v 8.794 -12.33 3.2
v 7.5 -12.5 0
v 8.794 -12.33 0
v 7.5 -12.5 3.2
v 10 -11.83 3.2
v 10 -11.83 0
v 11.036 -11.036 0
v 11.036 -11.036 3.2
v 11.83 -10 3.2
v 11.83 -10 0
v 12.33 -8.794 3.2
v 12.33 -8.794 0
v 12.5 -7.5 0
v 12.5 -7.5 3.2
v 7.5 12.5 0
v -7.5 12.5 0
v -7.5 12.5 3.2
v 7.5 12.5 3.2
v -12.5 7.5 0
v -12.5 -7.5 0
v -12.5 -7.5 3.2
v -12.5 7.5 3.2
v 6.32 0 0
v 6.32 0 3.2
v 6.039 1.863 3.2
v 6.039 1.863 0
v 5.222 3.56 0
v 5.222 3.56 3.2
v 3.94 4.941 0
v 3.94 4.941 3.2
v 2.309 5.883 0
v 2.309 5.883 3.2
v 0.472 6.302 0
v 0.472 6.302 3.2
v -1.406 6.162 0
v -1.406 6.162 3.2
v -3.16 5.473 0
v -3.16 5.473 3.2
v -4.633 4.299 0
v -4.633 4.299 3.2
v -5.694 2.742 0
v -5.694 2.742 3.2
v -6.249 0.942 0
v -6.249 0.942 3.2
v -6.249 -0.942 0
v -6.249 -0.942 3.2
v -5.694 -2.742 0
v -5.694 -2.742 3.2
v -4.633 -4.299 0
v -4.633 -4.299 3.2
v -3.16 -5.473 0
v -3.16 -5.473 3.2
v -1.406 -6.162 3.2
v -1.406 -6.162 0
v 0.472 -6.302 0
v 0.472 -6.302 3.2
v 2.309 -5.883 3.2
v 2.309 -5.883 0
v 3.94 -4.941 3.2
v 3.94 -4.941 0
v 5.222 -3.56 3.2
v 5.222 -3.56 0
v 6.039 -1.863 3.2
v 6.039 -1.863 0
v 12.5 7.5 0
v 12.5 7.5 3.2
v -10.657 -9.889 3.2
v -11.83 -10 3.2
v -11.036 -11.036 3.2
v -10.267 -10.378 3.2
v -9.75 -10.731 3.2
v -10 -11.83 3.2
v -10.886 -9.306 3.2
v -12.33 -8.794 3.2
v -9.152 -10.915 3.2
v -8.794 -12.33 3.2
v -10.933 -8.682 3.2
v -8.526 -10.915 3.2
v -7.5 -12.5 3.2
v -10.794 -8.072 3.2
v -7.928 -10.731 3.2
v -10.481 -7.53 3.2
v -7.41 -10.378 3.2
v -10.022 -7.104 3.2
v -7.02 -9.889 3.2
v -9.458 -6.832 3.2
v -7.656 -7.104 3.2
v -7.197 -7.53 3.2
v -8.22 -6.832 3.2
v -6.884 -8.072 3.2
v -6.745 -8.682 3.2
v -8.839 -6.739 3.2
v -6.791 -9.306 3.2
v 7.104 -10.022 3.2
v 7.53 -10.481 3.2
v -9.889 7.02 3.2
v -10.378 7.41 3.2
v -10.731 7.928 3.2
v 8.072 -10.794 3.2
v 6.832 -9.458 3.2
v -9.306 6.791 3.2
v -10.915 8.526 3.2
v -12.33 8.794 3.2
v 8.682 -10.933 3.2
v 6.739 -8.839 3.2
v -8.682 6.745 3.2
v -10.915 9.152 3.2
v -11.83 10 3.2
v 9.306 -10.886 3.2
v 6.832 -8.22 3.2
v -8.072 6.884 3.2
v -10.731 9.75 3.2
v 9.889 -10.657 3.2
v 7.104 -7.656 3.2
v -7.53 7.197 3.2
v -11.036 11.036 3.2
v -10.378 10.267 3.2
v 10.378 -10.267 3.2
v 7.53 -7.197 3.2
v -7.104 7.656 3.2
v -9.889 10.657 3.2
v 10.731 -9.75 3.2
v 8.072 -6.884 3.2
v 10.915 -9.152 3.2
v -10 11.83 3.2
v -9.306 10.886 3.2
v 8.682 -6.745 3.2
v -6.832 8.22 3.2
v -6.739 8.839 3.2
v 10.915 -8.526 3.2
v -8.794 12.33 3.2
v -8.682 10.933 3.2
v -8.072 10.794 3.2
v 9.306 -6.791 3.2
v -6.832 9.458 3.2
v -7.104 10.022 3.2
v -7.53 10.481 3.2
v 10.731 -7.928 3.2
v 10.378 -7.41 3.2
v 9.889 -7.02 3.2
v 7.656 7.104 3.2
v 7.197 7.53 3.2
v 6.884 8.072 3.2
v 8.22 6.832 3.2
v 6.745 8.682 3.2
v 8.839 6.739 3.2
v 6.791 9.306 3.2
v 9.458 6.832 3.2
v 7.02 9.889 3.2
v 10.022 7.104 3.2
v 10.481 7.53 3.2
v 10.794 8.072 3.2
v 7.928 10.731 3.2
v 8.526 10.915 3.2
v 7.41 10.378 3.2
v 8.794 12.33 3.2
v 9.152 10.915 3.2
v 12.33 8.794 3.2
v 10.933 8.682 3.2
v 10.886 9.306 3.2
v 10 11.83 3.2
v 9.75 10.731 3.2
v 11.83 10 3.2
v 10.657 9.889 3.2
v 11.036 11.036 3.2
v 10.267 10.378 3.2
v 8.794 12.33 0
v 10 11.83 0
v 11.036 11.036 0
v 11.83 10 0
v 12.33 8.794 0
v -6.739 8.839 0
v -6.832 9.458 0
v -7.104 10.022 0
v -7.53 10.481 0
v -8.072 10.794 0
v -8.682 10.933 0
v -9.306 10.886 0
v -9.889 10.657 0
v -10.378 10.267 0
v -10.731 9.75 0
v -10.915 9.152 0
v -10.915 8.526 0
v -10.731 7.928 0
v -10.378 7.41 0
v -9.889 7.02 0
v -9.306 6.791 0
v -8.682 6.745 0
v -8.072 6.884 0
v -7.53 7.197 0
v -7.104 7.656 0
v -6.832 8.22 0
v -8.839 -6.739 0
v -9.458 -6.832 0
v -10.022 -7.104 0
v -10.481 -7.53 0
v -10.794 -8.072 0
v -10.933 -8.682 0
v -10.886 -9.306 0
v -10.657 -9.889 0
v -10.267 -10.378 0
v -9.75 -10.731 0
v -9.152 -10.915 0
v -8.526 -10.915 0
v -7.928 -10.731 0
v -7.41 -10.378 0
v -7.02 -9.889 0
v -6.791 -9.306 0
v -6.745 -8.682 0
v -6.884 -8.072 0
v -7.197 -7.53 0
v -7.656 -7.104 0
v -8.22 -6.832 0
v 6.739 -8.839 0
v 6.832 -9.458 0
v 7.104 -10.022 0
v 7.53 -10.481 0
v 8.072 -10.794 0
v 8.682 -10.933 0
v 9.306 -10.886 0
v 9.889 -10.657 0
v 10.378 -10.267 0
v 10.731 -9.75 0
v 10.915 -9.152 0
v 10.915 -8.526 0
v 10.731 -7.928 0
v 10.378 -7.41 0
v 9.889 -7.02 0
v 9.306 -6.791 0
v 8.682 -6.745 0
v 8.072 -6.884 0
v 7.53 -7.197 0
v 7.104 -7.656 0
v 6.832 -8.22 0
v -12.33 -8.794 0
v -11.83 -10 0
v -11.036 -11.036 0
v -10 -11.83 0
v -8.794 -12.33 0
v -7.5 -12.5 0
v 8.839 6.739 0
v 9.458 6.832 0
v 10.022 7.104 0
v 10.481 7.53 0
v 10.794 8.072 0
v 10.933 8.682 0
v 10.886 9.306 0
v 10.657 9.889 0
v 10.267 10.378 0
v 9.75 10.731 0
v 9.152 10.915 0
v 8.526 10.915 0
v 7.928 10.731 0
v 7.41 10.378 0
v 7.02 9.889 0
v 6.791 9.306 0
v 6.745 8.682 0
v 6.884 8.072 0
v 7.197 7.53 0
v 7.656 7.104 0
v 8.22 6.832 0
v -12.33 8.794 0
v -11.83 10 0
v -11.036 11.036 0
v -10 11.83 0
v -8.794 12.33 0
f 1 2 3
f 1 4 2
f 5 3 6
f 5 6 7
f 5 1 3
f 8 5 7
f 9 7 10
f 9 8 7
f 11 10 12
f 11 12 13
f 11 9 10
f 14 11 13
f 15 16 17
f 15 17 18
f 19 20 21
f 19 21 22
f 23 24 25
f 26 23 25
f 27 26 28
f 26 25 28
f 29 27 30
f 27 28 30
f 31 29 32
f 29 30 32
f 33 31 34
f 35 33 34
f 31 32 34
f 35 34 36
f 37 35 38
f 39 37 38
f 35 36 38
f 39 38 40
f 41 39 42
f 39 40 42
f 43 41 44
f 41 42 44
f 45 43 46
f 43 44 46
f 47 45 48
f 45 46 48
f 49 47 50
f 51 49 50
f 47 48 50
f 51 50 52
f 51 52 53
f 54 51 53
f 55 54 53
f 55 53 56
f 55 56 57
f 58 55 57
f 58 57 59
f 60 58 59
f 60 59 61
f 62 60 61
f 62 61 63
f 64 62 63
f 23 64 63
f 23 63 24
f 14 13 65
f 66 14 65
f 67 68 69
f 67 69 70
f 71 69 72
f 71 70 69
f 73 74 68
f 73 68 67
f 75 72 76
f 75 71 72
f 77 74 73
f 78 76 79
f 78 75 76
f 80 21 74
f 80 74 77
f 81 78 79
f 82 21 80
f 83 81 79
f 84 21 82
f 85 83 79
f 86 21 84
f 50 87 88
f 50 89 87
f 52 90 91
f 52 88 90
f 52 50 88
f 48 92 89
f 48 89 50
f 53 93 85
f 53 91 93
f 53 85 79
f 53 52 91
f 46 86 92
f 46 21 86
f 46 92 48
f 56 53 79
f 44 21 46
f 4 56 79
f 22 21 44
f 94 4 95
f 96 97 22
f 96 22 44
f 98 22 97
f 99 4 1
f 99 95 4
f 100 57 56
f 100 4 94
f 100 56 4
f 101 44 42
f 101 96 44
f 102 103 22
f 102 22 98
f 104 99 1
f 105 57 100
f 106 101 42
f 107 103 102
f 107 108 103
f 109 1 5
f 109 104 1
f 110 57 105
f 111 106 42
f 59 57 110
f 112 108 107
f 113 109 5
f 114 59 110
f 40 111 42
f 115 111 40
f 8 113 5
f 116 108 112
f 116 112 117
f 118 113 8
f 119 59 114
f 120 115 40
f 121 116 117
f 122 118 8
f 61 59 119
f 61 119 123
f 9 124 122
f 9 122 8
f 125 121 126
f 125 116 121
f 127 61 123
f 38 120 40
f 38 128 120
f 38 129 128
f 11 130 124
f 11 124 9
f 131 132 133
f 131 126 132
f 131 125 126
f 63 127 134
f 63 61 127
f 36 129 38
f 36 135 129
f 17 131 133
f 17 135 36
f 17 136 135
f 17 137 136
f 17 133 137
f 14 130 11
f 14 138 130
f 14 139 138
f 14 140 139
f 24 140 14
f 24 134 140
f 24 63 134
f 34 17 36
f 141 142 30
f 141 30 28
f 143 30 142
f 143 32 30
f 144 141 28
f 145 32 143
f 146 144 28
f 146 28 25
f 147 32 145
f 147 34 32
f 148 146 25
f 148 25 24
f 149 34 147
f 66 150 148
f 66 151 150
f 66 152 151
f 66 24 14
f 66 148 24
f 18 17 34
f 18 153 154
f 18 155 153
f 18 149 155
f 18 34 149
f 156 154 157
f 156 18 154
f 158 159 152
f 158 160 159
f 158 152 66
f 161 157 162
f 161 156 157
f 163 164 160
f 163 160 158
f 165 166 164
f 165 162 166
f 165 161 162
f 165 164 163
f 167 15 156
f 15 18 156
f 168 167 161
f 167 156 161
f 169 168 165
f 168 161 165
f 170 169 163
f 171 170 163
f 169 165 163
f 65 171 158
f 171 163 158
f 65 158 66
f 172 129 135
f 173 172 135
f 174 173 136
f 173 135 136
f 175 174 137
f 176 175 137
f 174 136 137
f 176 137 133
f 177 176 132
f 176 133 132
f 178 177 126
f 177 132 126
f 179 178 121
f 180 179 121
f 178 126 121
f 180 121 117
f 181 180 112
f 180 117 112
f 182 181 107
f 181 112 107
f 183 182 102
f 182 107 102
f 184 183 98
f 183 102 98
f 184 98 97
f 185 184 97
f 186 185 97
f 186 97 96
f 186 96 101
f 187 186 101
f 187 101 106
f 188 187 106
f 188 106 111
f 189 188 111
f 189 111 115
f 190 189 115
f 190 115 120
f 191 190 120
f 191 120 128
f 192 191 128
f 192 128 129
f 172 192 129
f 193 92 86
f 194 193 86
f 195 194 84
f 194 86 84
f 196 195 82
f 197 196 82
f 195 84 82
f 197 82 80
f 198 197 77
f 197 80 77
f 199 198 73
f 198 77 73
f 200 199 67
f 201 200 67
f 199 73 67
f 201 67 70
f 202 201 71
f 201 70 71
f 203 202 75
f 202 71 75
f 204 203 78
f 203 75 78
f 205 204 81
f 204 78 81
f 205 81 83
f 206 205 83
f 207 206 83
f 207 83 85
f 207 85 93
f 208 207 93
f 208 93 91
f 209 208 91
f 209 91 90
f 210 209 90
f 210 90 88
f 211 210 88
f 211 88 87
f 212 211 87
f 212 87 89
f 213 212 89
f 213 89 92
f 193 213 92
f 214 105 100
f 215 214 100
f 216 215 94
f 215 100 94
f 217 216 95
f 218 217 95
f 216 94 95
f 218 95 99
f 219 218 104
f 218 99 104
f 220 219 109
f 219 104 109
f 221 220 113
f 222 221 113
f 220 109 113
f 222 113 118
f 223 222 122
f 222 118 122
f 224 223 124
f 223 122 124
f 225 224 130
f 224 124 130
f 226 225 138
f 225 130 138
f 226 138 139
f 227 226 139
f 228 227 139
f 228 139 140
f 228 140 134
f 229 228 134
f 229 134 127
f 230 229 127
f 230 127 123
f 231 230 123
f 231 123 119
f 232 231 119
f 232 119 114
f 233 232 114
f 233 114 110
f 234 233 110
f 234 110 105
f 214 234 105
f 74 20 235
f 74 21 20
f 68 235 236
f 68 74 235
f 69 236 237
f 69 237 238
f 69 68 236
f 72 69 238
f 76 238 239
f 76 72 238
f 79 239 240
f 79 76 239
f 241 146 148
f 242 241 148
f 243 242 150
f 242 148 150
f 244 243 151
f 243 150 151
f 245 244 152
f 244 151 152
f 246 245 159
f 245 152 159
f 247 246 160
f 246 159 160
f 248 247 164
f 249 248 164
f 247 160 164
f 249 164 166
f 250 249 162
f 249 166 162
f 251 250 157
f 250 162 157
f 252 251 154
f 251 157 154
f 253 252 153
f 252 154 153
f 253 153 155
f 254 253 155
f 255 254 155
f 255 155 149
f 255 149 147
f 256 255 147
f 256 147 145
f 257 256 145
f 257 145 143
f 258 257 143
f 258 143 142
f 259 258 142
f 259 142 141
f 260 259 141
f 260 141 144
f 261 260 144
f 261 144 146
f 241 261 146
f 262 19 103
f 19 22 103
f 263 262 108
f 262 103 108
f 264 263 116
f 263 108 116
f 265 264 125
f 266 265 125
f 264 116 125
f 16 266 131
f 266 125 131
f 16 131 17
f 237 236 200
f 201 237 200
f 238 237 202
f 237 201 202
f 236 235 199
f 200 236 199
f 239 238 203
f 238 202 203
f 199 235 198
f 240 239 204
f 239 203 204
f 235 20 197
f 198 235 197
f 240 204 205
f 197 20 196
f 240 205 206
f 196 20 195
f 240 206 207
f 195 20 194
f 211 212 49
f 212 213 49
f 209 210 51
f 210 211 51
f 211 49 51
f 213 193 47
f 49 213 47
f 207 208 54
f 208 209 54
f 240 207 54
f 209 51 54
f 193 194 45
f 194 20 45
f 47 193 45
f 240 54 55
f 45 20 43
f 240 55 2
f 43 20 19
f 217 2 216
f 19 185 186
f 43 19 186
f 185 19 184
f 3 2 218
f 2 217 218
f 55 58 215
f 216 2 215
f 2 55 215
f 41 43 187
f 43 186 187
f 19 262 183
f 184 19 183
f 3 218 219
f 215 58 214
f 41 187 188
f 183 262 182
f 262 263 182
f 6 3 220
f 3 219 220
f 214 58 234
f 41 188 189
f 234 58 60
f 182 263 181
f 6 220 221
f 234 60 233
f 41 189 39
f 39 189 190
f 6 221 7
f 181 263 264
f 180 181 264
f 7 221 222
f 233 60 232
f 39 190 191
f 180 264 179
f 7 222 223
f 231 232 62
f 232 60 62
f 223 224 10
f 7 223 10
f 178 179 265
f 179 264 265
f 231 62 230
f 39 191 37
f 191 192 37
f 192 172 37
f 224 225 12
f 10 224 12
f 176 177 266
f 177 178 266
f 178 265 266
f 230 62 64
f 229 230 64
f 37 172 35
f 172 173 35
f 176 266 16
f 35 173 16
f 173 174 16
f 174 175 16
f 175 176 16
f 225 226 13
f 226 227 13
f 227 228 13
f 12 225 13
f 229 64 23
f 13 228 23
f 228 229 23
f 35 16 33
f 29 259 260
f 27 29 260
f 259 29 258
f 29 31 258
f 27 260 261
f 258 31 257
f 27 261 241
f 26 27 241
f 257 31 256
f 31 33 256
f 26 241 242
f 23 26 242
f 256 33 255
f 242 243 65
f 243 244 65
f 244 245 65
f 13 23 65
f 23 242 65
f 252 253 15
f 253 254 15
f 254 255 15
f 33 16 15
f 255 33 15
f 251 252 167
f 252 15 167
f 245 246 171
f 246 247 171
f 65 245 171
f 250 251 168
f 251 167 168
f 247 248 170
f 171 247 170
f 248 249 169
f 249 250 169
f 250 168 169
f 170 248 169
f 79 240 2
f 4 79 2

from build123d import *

# Parameters (mm, degrees)
SKETCH1_W           = 25
SKETCH1_H           = 25
BOSS_EXTRUDE1_DEPTH = 3.2
CUT_EXTRUDE1_REACH  = 5.2
SKETCH2_R           = 6.32
SKETCH3_R           = 2.1
CUT_EXTRUDE2_DEPTH  = 4.2
CIRPATTERN1_COUNT   = 4
FILLET2_R           = 5


with BuildPart() as part:
    # Sketch1 → Boss-Extrude1 (new body)
    with BuildSketch(Plane.XY):
        Rectangle(SKETCH1_W, SKETCH1_H)
    extrude(amount=BOSS_EXTRUDE1_DEPTH)

    # Sketch2 → Cut-Extrude1 (cut, up to next)
    with BuildSketch(Plane.XY.offset(3.2), mode=Mode.PRIVATE) as cut_extrude1_sk1:
        Circle(SKETCH2_R)
    cut_extrude1_tool1 = extrude(cut_extrude1_sk1.sketch, amount=-CUT_EXTRUDE1_REACH, mode=Mode.PRIVATE) & part.part
    add(cut_extrude1_tool1.solids().sort_by_distance((0, 0, 3.2))[0], mode=Mode.SUBTRACT)

    # Sketch3 → Cut-Extrude2 (cut, through all)
    with BuildSketch(Plane.XY.offset(3.2)):
        with Locations((-8.838834765, 8.838834765)):
            Circle(SKETCH3_R)
    cut_extrude2 = extrude(amount=-CUT_EXTRUDE2_DEPTH, mode=Mode.SUBTRACT)

    # CirPattern1: Cut-Extrude2 ×4 about axis
    cirpattern1_axis = Axis((0, 0, 0), (0, 0, 1))
    for i in range(1, CIRPATTERN1_COUNT):
        add(cut_extrude2.rotate(cirpattern1_axis, i * 360 / CIRPATTERN1_COUNT), mode=Mode.SUBTRACT)

    # Fillet2
    fillet2_edges = [part.edges().sort_by_distance(p)[0] for p in [
        (12.5, -12.5, 1.6),
        (-12.5, -12.5, 1.6),
        (-12.5, 12.5, 1.6),
        (12.5, 12.5, 1.6),
    ]]
    fillet(fillet2_edges, radius=FILLET2_R)


solid = part.part
